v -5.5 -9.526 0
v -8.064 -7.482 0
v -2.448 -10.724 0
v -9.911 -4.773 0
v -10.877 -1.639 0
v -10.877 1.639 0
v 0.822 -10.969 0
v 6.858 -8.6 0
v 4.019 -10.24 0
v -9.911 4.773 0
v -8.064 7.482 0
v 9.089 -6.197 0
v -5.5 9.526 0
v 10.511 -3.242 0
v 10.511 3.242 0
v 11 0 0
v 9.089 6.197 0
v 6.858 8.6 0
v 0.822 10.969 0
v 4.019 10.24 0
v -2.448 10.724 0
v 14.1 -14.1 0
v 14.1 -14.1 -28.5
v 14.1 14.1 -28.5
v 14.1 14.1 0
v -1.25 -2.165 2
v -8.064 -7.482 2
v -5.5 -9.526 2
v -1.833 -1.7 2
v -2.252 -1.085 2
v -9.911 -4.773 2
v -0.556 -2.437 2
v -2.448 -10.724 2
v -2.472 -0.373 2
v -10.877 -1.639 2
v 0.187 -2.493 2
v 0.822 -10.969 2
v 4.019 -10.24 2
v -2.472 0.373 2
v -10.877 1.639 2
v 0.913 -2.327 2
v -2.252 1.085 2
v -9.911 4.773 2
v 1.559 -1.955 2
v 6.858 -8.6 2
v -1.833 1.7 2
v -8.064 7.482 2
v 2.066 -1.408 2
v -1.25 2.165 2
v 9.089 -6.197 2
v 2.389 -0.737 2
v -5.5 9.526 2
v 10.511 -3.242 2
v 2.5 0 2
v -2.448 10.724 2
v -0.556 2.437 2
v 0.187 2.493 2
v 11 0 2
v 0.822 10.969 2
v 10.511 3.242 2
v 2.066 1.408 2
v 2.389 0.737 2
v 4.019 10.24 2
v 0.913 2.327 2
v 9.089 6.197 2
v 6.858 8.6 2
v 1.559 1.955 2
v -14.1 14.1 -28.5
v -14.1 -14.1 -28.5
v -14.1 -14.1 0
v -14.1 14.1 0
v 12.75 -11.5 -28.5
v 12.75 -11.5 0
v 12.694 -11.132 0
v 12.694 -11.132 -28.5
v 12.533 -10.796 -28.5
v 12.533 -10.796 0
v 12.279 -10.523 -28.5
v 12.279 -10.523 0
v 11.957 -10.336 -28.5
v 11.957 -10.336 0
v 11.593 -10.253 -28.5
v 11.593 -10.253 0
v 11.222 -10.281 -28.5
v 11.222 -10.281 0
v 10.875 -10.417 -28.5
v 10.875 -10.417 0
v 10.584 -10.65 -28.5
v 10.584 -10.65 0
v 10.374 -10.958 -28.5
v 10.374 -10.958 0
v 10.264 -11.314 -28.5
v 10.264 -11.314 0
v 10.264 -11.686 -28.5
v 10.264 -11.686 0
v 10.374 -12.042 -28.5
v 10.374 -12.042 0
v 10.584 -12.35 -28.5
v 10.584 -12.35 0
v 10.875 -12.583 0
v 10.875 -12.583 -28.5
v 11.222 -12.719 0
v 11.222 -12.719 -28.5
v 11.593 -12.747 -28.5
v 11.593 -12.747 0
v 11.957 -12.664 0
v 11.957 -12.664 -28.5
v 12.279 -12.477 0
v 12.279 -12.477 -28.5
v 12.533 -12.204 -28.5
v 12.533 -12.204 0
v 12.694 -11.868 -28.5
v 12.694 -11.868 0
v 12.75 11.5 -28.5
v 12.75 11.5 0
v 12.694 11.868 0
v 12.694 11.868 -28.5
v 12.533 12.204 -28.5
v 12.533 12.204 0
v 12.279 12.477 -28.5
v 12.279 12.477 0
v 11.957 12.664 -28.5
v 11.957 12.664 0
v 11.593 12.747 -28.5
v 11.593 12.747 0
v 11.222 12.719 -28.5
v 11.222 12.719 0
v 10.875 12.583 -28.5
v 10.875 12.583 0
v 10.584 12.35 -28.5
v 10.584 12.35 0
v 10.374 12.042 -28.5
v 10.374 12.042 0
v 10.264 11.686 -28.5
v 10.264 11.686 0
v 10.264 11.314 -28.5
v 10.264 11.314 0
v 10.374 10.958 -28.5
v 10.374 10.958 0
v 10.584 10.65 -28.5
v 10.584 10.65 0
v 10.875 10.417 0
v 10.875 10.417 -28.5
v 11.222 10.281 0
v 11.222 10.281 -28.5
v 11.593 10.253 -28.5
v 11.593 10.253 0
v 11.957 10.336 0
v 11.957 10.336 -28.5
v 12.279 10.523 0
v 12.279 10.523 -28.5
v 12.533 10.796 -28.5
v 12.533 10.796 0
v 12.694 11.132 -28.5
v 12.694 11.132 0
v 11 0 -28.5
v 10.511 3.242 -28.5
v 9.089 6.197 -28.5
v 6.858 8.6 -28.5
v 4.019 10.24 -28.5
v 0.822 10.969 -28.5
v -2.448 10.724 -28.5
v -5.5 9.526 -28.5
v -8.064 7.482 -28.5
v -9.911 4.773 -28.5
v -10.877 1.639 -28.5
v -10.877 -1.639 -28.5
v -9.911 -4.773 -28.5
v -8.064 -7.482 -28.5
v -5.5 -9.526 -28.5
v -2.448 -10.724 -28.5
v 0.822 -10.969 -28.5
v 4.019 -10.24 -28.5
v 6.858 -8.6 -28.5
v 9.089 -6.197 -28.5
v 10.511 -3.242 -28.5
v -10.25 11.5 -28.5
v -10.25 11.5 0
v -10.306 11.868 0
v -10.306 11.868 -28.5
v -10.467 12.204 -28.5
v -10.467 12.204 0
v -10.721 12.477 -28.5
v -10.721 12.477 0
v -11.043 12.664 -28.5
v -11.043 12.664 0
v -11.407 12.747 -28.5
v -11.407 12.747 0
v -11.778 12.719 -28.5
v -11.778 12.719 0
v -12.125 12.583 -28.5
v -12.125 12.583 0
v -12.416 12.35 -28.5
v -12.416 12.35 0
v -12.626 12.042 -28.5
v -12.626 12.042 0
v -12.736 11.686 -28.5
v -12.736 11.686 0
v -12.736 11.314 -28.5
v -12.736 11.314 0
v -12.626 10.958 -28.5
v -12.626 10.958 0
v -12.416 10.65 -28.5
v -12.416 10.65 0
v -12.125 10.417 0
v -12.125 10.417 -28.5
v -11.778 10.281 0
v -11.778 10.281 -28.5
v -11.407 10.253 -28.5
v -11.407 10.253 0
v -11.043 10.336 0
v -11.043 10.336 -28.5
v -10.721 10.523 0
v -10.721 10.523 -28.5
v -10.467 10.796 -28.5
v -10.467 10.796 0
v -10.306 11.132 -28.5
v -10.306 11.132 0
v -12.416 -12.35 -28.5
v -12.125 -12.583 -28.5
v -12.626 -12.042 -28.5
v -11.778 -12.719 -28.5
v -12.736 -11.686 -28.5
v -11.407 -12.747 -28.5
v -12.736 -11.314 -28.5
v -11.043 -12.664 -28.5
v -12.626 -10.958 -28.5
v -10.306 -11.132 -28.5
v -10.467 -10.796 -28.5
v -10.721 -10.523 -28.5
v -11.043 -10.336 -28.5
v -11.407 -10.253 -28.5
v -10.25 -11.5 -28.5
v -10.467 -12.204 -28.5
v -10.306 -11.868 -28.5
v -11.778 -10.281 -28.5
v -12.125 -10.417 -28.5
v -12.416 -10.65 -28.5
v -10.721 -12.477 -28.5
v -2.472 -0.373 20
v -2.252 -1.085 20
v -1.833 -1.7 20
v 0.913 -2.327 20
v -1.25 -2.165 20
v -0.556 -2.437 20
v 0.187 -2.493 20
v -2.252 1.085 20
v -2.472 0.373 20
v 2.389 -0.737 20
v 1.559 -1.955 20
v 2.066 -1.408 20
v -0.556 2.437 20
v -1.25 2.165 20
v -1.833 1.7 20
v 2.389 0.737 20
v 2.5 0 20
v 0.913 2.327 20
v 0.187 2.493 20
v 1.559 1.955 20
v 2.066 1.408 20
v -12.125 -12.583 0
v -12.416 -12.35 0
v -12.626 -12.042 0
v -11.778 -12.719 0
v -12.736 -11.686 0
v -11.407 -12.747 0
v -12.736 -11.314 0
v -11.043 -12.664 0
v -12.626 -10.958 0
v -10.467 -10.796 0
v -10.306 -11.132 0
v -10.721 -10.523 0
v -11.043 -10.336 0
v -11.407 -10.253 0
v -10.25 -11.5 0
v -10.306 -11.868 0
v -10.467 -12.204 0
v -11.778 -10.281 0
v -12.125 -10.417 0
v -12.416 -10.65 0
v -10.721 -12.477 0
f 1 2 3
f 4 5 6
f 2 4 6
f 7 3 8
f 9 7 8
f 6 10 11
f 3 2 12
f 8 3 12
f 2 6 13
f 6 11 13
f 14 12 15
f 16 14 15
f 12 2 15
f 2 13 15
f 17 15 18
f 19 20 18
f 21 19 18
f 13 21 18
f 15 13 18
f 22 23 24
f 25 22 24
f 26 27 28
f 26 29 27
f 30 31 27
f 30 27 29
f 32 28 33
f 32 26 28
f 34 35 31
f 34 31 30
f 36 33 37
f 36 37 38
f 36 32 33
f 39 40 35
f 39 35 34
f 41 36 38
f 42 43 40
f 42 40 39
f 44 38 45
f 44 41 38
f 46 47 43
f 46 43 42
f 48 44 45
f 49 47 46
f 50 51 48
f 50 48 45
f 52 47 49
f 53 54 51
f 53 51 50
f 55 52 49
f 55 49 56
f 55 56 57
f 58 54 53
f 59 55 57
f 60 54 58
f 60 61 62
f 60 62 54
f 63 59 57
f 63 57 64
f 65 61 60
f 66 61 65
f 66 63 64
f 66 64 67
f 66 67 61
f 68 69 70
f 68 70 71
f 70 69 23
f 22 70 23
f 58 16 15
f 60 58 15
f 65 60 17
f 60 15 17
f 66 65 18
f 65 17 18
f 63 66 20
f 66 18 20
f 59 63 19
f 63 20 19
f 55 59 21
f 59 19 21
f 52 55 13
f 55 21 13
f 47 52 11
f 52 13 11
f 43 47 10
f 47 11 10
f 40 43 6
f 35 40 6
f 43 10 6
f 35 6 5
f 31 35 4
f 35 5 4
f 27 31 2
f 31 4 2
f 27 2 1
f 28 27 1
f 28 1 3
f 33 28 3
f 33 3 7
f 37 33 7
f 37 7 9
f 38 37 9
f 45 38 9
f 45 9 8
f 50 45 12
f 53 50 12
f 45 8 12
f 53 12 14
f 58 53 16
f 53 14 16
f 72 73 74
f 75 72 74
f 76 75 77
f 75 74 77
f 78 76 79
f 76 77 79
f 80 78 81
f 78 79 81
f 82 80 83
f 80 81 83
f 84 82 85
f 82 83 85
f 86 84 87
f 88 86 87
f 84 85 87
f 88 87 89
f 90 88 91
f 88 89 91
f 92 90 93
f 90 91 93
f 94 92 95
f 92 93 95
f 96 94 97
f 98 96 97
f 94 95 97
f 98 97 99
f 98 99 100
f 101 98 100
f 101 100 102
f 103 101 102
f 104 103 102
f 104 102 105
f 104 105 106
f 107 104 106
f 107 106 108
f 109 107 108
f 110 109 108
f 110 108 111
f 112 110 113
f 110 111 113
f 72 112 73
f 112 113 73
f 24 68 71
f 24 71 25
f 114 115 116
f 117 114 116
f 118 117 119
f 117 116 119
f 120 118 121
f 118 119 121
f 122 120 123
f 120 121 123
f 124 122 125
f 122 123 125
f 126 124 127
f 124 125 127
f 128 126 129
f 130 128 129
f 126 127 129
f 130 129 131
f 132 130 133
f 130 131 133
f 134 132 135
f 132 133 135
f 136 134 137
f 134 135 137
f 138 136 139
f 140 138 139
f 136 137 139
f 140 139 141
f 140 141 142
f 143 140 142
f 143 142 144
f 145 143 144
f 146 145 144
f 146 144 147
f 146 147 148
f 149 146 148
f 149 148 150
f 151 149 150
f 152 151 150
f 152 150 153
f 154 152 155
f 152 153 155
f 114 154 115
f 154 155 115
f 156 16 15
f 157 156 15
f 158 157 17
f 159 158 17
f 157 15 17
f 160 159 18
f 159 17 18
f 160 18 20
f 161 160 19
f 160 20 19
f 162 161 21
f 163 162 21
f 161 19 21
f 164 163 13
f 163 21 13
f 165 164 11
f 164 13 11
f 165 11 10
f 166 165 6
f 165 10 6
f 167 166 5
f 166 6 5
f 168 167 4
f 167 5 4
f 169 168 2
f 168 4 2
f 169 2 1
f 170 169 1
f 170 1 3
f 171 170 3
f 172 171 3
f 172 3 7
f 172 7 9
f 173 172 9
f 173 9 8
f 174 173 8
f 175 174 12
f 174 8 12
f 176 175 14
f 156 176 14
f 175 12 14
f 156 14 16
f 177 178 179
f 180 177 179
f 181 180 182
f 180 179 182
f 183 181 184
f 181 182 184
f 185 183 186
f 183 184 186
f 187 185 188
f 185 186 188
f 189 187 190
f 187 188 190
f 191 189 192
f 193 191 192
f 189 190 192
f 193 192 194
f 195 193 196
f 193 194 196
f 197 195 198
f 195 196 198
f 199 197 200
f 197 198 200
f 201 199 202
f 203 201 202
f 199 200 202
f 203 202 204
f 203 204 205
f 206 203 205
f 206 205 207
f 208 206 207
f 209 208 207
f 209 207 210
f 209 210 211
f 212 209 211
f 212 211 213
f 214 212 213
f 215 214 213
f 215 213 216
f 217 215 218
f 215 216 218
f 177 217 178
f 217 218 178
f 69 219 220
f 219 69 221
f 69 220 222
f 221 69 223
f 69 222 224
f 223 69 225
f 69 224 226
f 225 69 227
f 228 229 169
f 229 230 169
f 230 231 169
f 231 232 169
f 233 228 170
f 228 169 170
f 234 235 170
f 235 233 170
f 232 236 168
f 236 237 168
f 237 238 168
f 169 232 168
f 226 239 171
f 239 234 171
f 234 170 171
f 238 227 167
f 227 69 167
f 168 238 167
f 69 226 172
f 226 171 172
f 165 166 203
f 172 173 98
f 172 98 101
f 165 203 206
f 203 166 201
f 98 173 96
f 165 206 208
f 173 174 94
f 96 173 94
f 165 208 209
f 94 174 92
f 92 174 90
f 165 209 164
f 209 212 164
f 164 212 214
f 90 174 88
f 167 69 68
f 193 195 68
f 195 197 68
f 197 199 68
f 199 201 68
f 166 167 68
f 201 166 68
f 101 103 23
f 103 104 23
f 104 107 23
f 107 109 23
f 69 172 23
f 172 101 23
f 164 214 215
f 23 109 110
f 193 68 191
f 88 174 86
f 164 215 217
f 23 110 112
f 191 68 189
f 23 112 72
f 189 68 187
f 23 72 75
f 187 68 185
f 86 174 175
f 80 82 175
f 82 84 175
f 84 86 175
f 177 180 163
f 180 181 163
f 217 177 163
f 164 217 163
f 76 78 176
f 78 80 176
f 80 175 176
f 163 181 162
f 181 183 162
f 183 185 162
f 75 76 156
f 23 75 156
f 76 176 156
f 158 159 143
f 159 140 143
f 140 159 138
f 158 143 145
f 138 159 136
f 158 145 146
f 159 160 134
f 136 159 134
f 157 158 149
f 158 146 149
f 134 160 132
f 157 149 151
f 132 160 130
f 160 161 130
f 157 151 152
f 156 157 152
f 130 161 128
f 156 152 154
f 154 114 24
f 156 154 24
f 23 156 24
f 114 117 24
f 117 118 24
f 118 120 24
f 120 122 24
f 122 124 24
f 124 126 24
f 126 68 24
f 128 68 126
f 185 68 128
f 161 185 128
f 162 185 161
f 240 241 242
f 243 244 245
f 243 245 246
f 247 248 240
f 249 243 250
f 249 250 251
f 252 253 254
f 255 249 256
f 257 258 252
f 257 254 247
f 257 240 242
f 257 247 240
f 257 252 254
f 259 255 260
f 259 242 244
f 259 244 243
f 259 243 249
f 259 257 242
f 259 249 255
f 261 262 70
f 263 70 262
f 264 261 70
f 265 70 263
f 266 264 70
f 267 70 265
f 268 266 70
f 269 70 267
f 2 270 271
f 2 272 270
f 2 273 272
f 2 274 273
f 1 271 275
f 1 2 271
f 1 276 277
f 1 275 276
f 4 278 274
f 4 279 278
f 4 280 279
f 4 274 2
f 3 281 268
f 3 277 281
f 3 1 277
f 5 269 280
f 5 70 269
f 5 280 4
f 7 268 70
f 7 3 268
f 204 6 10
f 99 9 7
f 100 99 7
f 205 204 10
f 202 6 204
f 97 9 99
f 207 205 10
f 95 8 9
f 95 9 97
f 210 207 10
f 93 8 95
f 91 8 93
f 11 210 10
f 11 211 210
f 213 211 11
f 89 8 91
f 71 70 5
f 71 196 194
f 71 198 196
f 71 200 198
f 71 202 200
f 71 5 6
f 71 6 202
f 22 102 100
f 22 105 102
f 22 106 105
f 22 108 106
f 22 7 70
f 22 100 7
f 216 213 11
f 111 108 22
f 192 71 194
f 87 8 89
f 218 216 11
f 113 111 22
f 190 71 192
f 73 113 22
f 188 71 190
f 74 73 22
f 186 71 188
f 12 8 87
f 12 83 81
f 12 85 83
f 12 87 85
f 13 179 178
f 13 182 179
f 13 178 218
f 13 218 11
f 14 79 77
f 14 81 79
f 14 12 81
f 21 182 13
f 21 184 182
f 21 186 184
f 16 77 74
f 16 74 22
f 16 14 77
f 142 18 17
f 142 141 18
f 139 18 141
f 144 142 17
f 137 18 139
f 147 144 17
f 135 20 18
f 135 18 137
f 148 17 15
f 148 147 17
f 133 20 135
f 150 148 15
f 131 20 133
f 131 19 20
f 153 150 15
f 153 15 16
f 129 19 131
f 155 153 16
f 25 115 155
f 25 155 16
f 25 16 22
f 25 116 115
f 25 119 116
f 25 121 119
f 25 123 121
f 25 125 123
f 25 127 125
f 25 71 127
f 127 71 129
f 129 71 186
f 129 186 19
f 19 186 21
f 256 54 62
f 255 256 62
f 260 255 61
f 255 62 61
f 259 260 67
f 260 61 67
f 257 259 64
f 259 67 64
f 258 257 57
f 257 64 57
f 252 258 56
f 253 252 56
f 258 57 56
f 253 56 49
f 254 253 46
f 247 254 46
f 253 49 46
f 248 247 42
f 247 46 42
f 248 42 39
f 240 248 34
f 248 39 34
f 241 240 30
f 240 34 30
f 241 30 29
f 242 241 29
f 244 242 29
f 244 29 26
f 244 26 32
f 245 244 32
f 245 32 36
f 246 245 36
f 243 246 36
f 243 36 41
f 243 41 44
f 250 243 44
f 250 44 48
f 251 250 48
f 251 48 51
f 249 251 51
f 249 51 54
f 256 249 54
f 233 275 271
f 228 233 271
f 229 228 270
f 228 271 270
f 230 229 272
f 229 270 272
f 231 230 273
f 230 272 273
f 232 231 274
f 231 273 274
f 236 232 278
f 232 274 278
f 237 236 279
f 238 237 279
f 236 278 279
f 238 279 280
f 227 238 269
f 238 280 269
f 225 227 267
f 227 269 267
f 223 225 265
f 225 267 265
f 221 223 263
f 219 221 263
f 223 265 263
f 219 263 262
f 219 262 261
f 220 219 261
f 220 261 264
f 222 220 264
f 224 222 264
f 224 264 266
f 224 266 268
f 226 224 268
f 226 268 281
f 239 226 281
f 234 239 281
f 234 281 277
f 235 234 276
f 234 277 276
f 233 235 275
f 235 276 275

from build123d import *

# Parameters (mm, degrees)
SKETCH1_R           = 2.5
BOSS_EXTRUDE1_DEPTH = 20
SKETCH1_3_R         = 11
BOSS_EXTRUDE2_DEPTH = 2
SKETCH1_4_W         = 28.2
SKETCH1_4_H         = 28.2
SKETCH1_4_R         = 1.25
SKETCH1_4_R_2       = 11
BOSS_EXTRUDE3_DEPTH = 28.5


with BuildPart() as part:
    # Sketch1 → Boss-Extrude1 (new body)
    with BuildSketch(Plane.XY):
        Circle(SKETCH1_R)
    extrude(amount=BOSS_EXTRUDE1_DEPTH)

    # Sketch1<3> → Boss-Extrude2 (add)
    with BuildSketch(Plane.XY):
        Circle(SKETCH1_3_R)
    extrude(amount=BOSS_EXTRUDE2_DEPTH)


with BuildPart() as body_2:
    # Sketch1<4> → Boss-Extrude3 (new body)
    with BuildSketch(Plane.XY):
        Rectangle(SKETCH1_4_W, SKETCH1_4_H)
        with Locations((-11.5, -11.5)):
            Circle(SKETCH1_4_R, mode=Mode.SUBTRACT)
        with Locations((11.5, -11.5)):
            Circle(SKETCH1_4_R, mode=Mode.SUBTRACT)
        Circle(SKETCH1_4_R_2, mode=Mode.SUBTRACT)
        with Locations((-11.5, 11.5)):
            Circle(SKETCH1_4_R, mode=Mode.SUBTRACT)
        with Locations((11.5, 11.5)):
            Circle(SKETCH1_4_R, mode=Mode.SUBTRACT)
    extrude(amount=-BOSS_EXTRUDE3_DEPTH)


solid = Compound([part.part, body_2.part])
